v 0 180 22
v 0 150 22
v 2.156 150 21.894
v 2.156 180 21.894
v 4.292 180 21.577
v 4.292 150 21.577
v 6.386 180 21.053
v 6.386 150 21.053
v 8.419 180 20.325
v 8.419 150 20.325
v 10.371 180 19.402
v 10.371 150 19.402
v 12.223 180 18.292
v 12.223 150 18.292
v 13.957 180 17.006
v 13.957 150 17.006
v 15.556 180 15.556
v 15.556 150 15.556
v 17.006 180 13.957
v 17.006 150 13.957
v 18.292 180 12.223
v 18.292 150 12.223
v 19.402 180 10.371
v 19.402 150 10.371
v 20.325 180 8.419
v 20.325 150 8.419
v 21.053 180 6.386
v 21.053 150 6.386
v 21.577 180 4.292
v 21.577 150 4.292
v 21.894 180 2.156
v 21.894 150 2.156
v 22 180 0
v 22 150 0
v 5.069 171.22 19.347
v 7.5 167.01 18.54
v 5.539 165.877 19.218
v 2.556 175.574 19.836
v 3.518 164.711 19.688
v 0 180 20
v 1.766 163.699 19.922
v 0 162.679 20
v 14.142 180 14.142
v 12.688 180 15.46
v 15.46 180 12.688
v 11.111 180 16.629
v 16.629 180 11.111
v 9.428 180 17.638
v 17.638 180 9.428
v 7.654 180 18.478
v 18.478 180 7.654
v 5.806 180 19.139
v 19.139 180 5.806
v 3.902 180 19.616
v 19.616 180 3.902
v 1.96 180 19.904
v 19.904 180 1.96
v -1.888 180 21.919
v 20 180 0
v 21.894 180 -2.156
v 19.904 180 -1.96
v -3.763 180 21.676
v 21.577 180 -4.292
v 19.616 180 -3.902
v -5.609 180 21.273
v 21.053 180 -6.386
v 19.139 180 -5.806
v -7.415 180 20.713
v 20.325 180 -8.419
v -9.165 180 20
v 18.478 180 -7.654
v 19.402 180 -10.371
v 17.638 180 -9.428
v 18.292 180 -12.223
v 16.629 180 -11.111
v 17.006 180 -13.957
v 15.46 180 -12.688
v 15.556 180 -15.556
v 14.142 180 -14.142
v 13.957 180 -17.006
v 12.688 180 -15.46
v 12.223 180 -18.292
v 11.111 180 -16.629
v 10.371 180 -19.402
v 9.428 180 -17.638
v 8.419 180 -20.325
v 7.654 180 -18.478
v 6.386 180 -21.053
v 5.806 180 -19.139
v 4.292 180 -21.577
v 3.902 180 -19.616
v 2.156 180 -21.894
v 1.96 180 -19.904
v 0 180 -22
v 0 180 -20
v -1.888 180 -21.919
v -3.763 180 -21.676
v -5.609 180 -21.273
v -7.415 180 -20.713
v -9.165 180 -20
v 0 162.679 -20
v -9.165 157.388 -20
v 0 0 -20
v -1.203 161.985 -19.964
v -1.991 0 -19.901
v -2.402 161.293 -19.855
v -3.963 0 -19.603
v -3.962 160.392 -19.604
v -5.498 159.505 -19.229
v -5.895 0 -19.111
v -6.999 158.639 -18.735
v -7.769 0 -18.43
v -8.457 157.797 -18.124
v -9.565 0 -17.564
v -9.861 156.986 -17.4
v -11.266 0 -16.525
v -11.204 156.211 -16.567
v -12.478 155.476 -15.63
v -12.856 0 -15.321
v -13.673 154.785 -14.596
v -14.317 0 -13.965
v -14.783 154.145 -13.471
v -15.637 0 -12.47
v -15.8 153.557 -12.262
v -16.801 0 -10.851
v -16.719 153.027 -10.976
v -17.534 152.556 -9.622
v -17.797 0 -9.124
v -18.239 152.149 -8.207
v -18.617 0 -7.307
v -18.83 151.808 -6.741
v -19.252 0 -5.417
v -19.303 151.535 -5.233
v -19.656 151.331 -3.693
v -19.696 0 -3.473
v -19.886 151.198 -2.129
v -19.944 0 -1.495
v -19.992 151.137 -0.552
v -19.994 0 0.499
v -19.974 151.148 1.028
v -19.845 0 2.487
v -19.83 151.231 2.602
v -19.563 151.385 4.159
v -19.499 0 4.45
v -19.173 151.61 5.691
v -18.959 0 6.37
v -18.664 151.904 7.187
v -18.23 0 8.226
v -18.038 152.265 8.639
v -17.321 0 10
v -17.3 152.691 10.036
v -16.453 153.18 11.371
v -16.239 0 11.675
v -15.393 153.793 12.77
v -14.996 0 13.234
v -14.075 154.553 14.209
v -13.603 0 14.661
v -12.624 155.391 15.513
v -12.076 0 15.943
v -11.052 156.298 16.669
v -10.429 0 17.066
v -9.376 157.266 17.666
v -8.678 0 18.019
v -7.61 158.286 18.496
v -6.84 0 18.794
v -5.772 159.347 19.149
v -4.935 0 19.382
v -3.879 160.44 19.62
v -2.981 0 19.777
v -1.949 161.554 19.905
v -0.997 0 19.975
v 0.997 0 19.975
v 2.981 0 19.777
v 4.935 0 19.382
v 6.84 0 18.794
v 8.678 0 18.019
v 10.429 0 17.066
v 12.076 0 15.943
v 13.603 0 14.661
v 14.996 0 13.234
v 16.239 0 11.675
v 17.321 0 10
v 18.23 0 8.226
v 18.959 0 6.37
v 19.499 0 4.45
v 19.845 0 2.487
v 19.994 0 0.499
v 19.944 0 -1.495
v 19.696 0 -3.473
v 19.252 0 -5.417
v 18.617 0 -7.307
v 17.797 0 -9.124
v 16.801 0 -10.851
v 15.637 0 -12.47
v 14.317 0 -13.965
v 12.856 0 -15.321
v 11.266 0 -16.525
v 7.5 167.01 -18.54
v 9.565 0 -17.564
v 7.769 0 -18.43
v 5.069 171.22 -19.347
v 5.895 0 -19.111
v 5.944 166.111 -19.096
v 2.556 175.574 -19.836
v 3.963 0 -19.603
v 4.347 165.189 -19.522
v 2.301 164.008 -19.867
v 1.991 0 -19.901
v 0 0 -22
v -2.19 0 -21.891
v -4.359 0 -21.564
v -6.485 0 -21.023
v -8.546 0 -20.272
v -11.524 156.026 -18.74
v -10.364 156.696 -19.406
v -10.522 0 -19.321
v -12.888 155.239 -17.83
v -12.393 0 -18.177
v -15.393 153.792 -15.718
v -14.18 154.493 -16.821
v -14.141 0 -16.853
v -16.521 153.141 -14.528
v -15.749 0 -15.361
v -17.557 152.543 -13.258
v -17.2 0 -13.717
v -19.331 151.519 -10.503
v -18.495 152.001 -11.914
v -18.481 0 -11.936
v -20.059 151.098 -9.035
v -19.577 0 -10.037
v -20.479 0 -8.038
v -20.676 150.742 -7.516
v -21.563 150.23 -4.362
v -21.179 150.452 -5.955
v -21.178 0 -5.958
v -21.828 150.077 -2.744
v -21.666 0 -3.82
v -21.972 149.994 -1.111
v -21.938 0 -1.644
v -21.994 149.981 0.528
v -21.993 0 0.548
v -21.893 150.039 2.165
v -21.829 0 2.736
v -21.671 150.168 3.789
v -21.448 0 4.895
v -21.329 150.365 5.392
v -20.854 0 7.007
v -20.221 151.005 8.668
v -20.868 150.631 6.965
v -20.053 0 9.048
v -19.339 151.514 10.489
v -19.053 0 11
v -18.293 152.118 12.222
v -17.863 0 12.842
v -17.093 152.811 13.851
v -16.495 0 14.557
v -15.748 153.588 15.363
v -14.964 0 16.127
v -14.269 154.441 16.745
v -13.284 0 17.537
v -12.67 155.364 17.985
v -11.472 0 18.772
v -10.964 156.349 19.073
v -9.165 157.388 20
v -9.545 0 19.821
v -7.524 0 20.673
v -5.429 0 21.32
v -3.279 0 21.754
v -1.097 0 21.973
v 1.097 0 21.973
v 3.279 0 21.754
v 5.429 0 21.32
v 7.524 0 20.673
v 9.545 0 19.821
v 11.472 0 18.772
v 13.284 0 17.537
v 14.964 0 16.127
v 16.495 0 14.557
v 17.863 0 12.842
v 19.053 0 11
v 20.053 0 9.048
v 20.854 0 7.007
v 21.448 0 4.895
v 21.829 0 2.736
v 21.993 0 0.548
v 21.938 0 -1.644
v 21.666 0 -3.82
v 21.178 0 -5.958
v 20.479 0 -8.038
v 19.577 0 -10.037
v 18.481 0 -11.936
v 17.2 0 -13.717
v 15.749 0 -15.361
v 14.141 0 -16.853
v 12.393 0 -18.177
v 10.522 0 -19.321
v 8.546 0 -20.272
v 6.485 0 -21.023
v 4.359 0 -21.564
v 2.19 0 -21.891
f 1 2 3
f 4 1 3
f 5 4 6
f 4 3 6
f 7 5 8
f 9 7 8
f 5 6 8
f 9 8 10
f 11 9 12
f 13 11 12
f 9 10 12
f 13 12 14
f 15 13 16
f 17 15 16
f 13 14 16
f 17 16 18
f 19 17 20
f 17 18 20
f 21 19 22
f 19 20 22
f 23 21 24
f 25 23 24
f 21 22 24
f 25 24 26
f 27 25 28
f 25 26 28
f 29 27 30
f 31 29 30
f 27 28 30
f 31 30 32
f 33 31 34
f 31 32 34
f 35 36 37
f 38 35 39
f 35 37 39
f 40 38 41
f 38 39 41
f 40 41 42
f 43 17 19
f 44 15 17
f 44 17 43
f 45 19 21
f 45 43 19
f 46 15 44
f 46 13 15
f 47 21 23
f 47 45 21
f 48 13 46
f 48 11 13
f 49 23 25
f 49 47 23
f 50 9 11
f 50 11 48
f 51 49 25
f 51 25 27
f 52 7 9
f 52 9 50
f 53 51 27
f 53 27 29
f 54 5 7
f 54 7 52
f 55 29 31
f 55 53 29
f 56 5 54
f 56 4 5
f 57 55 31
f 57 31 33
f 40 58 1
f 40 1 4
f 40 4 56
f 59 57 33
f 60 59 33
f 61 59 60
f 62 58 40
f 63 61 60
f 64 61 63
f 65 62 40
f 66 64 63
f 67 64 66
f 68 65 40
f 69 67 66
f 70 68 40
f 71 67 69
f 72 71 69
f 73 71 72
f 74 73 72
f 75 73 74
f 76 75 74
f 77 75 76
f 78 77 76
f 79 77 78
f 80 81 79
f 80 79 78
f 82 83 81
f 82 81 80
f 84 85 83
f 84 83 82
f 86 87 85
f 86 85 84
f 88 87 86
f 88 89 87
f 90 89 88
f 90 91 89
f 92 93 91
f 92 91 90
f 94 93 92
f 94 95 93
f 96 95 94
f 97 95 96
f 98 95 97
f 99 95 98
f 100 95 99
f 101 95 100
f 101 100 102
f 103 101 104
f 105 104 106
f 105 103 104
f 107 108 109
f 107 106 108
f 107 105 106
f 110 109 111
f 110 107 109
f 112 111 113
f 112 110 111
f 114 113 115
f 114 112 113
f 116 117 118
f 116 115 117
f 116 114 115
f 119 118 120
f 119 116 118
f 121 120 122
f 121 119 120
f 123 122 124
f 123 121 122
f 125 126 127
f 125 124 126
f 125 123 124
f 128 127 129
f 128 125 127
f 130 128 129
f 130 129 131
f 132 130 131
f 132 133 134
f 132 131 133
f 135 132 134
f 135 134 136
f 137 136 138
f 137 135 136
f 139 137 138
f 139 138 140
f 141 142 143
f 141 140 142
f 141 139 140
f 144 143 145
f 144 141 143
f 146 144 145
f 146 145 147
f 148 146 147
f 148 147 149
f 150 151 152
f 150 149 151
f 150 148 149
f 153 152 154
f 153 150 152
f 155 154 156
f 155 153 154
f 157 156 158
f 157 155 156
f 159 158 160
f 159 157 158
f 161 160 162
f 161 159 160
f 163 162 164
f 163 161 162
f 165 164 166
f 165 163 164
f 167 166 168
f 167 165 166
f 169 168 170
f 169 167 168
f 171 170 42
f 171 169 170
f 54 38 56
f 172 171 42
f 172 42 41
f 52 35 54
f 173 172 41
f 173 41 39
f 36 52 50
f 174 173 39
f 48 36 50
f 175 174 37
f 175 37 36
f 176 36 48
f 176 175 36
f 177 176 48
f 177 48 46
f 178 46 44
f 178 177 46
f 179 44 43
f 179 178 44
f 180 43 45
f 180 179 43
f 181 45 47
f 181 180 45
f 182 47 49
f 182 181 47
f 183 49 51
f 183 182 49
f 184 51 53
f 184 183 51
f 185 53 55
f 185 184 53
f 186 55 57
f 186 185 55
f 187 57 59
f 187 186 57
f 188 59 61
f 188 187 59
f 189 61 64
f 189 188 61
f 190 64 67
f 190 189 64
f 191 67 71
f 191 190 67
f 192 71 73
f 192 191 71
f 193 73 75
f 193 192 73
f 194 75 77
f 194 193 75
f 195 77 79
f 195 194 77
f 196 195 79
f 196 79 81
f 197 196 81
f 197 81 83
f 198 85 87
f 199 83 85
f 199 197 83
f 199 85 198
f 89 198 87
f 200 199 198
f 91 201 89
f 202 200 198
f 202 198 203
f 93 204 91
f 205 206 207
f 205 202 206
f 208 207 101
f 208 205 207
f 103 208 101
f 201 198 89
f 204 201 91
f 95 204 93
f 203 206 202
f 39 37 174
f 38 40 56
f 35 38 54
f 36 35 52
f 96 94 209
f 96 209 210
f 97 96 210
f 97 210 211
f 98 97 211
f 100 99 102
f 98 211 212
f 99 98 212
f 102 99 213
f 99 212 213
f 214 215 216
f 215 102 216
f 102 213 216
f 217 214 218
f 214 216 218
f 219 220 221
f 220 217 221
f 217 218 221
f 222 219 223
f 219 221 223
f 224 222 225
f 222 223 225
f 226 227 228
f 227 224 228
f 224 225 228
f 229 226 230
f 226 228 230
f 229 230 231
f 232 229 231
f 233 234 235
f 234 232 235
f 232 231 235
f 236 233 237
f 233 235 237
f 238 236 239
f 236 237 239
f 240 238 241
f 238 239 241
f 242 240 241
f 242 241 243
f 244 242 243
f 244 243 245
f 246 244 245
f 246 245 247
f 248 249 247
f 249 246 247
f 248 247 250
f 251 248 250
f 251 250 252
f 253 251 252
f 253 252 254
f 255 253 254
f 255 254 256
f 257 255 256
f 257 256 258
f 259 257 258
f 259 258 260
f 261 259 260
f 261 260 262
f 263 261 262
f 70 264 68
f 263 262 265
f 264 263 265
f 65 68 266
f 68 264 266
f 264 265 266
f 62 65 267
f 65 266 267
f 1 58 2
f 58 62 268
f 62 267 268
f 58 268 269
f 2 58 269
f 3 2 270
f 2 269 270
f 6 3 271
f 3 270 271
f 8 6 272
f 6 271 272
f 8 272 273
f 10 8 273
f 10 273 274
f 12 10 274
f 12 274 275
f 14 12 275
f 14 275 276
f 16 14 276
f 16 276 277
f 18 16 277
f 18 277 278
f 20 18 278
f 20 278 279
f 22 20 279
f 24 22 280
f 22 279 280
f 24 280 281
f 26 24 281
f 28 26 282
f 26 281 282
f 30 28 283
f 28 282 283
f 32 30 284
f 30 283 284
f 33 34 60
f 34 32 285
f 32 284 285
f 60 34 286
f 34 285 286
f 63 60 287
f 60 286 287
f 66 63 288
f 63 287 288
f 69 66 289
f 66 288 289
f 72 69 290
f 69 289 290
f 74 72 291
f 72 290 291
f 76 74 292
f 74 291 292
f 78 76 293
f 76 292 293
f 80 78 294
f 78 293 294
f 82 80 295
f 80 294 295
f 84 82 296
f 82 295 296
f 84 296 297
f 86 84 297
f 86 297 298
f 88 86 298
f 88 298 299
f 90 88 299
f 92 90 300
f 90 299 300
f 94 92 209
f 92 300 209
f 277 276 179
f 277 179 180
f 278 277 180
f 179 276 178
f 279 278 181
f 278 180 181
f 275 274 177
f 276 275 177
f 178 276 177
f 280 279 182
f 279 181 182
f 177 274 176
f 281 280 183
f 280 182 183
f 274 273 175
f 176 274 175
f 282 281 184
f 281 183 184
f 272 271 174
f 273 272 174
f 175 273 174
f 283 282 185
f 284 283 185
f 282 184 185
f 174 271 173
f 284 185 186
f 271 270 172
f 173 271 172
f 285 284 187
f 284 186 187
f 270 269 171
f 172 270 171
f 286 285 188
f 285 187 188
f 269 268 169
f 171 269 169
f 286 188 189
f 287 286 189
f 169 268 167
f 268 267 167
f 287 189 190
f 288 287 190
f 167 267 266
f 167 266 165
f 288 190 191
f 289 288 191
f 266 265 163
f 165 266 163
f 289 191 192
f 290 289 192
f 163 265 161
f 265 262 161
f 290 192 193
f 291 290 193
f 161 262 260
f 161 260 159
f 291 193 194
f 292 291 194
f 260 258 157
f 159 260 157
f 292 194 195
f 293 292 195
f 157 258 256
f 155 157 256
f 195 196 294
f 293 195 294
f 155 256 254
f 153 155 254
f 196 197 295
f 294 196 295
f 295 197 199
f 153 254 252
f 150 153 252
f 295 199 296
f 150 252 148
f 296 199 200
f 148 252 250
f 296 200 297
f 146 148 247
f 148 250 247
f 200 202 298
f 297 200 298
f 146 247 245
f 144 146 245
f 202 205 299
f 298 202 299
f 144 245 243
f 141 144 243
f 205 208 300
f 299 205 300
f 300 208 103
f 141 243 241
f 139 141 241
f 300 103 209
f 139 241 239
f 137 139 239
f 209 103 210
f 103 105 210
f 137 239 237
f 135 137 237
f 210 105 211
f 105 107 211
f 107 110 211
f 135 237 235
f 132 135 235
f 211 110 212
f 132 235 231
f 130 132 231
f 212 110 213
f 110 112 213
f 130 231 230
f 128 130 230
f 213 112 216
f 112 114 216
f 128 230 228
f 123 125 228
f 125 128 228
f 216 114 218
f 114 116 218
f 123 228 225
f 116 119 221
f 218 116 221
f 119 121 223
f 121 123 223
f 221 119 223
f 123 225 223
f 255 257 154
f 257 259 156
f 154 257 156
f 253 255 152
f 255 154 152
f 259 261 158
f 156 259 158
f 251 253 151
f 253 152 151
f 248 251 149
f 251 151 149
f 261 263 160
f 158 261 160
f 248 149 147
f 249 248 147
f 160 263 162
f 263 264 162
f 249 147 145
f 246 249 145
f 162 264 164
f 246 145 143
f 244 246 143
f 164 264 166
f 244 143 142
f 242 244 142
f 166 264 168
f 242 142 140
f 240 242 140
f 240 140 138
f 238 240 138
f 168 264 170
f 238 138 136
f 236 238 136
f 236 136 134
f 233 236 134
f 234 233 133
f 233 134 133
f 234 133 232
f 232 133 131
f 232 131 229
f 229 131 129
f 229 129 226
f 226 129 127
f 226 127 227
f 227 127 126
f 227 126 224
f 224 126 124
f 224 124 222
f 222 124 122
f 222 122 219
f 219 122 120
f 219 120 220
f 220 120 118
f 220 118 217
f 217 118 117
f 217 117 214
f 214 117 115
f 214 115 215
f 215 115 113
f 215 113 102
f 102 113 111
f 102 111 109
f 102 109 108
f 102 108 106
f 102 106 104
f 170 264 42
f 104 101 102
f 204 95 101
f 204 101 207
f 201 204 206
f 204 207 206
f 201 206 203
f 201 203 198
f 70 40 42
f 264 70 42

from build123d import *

# Parameters (mm, degrees)
SKETCH1_R           = 22
SKETCH1_R_2         = 20
BOSS_EXTRUDE1_DEPTH = 180
SKETCH3_W           = 30
SKETCH3_H           = 40
CUT_EXTRUDE1_DEPTH  = 63
BOSS_EXTRUDE2_START = 150
BOSS_EXTRUDE2_DEPTH = 30


with BuildPart() as part:
    # Sketch1 → Boss-Extrude1 (new body)
    with BuildSketch(Plane(origin=(0, 0, 0), x_dir=(1, 0, 0), z_dir=(0, 1, 0))):
        with Locations(Location((0, 0, 0), (0, 0, 90))):
            Circle(SKETCH1_R)
        with Locations(Location((0, 0, 0), (0, 0, 90))):
            Circle(SKETCH1_R_2, mode=Mode.SUBTRACT)
    extrude(amount=BOSS_EXTRUDE1_DEPTH)

    # Sketch3 → Cut-Extrude1 (cut)
    with BuildSketch(Plane(origin=(77.942286341, 45, 0), x_dir=(0.5000000000000041, -0.8660254037844362, 0), z_dir=(0.8660254037844363, 0.5000000000000042, 0))):
        with Locations((-155.884572681, 0)):
            Rectangle(SKETCH3_W, SKETCH3_H)
    extrude(amount=-CUT_EXTRUDE1_DEPTH, mode=Mode.SUBTRACT)

    # Sketch1<3> → Boss-Extrude2 (add)
    with BuildSketch(Plane(origin=(0, 0, 0), x_dir=(1, 0, 0), z_dir=(0, 1, 0)).offset(BOSS_EXTRUDE2_START)):
        with BuildLine():
            ThreePointArc((20, 0), (14.142135624, -14.142135624), (0, -20))
            Line((0, -20), (0, -22))
            ThreePointArc((0, -22), (15.556349186, -15.556349186), (22, 0))
            ThreePointArc((22, 0), (15.556349186, 15.556349186), (0, 22))
            Line((0, 22), (0, 20))
            ThreePointArc((0, 20), (14.142135624, 14.142135624), (20, 0))
        make_face()
    extrude(amount=BOSS_EXTRUDE2_DEPTH)


solid = part.part
